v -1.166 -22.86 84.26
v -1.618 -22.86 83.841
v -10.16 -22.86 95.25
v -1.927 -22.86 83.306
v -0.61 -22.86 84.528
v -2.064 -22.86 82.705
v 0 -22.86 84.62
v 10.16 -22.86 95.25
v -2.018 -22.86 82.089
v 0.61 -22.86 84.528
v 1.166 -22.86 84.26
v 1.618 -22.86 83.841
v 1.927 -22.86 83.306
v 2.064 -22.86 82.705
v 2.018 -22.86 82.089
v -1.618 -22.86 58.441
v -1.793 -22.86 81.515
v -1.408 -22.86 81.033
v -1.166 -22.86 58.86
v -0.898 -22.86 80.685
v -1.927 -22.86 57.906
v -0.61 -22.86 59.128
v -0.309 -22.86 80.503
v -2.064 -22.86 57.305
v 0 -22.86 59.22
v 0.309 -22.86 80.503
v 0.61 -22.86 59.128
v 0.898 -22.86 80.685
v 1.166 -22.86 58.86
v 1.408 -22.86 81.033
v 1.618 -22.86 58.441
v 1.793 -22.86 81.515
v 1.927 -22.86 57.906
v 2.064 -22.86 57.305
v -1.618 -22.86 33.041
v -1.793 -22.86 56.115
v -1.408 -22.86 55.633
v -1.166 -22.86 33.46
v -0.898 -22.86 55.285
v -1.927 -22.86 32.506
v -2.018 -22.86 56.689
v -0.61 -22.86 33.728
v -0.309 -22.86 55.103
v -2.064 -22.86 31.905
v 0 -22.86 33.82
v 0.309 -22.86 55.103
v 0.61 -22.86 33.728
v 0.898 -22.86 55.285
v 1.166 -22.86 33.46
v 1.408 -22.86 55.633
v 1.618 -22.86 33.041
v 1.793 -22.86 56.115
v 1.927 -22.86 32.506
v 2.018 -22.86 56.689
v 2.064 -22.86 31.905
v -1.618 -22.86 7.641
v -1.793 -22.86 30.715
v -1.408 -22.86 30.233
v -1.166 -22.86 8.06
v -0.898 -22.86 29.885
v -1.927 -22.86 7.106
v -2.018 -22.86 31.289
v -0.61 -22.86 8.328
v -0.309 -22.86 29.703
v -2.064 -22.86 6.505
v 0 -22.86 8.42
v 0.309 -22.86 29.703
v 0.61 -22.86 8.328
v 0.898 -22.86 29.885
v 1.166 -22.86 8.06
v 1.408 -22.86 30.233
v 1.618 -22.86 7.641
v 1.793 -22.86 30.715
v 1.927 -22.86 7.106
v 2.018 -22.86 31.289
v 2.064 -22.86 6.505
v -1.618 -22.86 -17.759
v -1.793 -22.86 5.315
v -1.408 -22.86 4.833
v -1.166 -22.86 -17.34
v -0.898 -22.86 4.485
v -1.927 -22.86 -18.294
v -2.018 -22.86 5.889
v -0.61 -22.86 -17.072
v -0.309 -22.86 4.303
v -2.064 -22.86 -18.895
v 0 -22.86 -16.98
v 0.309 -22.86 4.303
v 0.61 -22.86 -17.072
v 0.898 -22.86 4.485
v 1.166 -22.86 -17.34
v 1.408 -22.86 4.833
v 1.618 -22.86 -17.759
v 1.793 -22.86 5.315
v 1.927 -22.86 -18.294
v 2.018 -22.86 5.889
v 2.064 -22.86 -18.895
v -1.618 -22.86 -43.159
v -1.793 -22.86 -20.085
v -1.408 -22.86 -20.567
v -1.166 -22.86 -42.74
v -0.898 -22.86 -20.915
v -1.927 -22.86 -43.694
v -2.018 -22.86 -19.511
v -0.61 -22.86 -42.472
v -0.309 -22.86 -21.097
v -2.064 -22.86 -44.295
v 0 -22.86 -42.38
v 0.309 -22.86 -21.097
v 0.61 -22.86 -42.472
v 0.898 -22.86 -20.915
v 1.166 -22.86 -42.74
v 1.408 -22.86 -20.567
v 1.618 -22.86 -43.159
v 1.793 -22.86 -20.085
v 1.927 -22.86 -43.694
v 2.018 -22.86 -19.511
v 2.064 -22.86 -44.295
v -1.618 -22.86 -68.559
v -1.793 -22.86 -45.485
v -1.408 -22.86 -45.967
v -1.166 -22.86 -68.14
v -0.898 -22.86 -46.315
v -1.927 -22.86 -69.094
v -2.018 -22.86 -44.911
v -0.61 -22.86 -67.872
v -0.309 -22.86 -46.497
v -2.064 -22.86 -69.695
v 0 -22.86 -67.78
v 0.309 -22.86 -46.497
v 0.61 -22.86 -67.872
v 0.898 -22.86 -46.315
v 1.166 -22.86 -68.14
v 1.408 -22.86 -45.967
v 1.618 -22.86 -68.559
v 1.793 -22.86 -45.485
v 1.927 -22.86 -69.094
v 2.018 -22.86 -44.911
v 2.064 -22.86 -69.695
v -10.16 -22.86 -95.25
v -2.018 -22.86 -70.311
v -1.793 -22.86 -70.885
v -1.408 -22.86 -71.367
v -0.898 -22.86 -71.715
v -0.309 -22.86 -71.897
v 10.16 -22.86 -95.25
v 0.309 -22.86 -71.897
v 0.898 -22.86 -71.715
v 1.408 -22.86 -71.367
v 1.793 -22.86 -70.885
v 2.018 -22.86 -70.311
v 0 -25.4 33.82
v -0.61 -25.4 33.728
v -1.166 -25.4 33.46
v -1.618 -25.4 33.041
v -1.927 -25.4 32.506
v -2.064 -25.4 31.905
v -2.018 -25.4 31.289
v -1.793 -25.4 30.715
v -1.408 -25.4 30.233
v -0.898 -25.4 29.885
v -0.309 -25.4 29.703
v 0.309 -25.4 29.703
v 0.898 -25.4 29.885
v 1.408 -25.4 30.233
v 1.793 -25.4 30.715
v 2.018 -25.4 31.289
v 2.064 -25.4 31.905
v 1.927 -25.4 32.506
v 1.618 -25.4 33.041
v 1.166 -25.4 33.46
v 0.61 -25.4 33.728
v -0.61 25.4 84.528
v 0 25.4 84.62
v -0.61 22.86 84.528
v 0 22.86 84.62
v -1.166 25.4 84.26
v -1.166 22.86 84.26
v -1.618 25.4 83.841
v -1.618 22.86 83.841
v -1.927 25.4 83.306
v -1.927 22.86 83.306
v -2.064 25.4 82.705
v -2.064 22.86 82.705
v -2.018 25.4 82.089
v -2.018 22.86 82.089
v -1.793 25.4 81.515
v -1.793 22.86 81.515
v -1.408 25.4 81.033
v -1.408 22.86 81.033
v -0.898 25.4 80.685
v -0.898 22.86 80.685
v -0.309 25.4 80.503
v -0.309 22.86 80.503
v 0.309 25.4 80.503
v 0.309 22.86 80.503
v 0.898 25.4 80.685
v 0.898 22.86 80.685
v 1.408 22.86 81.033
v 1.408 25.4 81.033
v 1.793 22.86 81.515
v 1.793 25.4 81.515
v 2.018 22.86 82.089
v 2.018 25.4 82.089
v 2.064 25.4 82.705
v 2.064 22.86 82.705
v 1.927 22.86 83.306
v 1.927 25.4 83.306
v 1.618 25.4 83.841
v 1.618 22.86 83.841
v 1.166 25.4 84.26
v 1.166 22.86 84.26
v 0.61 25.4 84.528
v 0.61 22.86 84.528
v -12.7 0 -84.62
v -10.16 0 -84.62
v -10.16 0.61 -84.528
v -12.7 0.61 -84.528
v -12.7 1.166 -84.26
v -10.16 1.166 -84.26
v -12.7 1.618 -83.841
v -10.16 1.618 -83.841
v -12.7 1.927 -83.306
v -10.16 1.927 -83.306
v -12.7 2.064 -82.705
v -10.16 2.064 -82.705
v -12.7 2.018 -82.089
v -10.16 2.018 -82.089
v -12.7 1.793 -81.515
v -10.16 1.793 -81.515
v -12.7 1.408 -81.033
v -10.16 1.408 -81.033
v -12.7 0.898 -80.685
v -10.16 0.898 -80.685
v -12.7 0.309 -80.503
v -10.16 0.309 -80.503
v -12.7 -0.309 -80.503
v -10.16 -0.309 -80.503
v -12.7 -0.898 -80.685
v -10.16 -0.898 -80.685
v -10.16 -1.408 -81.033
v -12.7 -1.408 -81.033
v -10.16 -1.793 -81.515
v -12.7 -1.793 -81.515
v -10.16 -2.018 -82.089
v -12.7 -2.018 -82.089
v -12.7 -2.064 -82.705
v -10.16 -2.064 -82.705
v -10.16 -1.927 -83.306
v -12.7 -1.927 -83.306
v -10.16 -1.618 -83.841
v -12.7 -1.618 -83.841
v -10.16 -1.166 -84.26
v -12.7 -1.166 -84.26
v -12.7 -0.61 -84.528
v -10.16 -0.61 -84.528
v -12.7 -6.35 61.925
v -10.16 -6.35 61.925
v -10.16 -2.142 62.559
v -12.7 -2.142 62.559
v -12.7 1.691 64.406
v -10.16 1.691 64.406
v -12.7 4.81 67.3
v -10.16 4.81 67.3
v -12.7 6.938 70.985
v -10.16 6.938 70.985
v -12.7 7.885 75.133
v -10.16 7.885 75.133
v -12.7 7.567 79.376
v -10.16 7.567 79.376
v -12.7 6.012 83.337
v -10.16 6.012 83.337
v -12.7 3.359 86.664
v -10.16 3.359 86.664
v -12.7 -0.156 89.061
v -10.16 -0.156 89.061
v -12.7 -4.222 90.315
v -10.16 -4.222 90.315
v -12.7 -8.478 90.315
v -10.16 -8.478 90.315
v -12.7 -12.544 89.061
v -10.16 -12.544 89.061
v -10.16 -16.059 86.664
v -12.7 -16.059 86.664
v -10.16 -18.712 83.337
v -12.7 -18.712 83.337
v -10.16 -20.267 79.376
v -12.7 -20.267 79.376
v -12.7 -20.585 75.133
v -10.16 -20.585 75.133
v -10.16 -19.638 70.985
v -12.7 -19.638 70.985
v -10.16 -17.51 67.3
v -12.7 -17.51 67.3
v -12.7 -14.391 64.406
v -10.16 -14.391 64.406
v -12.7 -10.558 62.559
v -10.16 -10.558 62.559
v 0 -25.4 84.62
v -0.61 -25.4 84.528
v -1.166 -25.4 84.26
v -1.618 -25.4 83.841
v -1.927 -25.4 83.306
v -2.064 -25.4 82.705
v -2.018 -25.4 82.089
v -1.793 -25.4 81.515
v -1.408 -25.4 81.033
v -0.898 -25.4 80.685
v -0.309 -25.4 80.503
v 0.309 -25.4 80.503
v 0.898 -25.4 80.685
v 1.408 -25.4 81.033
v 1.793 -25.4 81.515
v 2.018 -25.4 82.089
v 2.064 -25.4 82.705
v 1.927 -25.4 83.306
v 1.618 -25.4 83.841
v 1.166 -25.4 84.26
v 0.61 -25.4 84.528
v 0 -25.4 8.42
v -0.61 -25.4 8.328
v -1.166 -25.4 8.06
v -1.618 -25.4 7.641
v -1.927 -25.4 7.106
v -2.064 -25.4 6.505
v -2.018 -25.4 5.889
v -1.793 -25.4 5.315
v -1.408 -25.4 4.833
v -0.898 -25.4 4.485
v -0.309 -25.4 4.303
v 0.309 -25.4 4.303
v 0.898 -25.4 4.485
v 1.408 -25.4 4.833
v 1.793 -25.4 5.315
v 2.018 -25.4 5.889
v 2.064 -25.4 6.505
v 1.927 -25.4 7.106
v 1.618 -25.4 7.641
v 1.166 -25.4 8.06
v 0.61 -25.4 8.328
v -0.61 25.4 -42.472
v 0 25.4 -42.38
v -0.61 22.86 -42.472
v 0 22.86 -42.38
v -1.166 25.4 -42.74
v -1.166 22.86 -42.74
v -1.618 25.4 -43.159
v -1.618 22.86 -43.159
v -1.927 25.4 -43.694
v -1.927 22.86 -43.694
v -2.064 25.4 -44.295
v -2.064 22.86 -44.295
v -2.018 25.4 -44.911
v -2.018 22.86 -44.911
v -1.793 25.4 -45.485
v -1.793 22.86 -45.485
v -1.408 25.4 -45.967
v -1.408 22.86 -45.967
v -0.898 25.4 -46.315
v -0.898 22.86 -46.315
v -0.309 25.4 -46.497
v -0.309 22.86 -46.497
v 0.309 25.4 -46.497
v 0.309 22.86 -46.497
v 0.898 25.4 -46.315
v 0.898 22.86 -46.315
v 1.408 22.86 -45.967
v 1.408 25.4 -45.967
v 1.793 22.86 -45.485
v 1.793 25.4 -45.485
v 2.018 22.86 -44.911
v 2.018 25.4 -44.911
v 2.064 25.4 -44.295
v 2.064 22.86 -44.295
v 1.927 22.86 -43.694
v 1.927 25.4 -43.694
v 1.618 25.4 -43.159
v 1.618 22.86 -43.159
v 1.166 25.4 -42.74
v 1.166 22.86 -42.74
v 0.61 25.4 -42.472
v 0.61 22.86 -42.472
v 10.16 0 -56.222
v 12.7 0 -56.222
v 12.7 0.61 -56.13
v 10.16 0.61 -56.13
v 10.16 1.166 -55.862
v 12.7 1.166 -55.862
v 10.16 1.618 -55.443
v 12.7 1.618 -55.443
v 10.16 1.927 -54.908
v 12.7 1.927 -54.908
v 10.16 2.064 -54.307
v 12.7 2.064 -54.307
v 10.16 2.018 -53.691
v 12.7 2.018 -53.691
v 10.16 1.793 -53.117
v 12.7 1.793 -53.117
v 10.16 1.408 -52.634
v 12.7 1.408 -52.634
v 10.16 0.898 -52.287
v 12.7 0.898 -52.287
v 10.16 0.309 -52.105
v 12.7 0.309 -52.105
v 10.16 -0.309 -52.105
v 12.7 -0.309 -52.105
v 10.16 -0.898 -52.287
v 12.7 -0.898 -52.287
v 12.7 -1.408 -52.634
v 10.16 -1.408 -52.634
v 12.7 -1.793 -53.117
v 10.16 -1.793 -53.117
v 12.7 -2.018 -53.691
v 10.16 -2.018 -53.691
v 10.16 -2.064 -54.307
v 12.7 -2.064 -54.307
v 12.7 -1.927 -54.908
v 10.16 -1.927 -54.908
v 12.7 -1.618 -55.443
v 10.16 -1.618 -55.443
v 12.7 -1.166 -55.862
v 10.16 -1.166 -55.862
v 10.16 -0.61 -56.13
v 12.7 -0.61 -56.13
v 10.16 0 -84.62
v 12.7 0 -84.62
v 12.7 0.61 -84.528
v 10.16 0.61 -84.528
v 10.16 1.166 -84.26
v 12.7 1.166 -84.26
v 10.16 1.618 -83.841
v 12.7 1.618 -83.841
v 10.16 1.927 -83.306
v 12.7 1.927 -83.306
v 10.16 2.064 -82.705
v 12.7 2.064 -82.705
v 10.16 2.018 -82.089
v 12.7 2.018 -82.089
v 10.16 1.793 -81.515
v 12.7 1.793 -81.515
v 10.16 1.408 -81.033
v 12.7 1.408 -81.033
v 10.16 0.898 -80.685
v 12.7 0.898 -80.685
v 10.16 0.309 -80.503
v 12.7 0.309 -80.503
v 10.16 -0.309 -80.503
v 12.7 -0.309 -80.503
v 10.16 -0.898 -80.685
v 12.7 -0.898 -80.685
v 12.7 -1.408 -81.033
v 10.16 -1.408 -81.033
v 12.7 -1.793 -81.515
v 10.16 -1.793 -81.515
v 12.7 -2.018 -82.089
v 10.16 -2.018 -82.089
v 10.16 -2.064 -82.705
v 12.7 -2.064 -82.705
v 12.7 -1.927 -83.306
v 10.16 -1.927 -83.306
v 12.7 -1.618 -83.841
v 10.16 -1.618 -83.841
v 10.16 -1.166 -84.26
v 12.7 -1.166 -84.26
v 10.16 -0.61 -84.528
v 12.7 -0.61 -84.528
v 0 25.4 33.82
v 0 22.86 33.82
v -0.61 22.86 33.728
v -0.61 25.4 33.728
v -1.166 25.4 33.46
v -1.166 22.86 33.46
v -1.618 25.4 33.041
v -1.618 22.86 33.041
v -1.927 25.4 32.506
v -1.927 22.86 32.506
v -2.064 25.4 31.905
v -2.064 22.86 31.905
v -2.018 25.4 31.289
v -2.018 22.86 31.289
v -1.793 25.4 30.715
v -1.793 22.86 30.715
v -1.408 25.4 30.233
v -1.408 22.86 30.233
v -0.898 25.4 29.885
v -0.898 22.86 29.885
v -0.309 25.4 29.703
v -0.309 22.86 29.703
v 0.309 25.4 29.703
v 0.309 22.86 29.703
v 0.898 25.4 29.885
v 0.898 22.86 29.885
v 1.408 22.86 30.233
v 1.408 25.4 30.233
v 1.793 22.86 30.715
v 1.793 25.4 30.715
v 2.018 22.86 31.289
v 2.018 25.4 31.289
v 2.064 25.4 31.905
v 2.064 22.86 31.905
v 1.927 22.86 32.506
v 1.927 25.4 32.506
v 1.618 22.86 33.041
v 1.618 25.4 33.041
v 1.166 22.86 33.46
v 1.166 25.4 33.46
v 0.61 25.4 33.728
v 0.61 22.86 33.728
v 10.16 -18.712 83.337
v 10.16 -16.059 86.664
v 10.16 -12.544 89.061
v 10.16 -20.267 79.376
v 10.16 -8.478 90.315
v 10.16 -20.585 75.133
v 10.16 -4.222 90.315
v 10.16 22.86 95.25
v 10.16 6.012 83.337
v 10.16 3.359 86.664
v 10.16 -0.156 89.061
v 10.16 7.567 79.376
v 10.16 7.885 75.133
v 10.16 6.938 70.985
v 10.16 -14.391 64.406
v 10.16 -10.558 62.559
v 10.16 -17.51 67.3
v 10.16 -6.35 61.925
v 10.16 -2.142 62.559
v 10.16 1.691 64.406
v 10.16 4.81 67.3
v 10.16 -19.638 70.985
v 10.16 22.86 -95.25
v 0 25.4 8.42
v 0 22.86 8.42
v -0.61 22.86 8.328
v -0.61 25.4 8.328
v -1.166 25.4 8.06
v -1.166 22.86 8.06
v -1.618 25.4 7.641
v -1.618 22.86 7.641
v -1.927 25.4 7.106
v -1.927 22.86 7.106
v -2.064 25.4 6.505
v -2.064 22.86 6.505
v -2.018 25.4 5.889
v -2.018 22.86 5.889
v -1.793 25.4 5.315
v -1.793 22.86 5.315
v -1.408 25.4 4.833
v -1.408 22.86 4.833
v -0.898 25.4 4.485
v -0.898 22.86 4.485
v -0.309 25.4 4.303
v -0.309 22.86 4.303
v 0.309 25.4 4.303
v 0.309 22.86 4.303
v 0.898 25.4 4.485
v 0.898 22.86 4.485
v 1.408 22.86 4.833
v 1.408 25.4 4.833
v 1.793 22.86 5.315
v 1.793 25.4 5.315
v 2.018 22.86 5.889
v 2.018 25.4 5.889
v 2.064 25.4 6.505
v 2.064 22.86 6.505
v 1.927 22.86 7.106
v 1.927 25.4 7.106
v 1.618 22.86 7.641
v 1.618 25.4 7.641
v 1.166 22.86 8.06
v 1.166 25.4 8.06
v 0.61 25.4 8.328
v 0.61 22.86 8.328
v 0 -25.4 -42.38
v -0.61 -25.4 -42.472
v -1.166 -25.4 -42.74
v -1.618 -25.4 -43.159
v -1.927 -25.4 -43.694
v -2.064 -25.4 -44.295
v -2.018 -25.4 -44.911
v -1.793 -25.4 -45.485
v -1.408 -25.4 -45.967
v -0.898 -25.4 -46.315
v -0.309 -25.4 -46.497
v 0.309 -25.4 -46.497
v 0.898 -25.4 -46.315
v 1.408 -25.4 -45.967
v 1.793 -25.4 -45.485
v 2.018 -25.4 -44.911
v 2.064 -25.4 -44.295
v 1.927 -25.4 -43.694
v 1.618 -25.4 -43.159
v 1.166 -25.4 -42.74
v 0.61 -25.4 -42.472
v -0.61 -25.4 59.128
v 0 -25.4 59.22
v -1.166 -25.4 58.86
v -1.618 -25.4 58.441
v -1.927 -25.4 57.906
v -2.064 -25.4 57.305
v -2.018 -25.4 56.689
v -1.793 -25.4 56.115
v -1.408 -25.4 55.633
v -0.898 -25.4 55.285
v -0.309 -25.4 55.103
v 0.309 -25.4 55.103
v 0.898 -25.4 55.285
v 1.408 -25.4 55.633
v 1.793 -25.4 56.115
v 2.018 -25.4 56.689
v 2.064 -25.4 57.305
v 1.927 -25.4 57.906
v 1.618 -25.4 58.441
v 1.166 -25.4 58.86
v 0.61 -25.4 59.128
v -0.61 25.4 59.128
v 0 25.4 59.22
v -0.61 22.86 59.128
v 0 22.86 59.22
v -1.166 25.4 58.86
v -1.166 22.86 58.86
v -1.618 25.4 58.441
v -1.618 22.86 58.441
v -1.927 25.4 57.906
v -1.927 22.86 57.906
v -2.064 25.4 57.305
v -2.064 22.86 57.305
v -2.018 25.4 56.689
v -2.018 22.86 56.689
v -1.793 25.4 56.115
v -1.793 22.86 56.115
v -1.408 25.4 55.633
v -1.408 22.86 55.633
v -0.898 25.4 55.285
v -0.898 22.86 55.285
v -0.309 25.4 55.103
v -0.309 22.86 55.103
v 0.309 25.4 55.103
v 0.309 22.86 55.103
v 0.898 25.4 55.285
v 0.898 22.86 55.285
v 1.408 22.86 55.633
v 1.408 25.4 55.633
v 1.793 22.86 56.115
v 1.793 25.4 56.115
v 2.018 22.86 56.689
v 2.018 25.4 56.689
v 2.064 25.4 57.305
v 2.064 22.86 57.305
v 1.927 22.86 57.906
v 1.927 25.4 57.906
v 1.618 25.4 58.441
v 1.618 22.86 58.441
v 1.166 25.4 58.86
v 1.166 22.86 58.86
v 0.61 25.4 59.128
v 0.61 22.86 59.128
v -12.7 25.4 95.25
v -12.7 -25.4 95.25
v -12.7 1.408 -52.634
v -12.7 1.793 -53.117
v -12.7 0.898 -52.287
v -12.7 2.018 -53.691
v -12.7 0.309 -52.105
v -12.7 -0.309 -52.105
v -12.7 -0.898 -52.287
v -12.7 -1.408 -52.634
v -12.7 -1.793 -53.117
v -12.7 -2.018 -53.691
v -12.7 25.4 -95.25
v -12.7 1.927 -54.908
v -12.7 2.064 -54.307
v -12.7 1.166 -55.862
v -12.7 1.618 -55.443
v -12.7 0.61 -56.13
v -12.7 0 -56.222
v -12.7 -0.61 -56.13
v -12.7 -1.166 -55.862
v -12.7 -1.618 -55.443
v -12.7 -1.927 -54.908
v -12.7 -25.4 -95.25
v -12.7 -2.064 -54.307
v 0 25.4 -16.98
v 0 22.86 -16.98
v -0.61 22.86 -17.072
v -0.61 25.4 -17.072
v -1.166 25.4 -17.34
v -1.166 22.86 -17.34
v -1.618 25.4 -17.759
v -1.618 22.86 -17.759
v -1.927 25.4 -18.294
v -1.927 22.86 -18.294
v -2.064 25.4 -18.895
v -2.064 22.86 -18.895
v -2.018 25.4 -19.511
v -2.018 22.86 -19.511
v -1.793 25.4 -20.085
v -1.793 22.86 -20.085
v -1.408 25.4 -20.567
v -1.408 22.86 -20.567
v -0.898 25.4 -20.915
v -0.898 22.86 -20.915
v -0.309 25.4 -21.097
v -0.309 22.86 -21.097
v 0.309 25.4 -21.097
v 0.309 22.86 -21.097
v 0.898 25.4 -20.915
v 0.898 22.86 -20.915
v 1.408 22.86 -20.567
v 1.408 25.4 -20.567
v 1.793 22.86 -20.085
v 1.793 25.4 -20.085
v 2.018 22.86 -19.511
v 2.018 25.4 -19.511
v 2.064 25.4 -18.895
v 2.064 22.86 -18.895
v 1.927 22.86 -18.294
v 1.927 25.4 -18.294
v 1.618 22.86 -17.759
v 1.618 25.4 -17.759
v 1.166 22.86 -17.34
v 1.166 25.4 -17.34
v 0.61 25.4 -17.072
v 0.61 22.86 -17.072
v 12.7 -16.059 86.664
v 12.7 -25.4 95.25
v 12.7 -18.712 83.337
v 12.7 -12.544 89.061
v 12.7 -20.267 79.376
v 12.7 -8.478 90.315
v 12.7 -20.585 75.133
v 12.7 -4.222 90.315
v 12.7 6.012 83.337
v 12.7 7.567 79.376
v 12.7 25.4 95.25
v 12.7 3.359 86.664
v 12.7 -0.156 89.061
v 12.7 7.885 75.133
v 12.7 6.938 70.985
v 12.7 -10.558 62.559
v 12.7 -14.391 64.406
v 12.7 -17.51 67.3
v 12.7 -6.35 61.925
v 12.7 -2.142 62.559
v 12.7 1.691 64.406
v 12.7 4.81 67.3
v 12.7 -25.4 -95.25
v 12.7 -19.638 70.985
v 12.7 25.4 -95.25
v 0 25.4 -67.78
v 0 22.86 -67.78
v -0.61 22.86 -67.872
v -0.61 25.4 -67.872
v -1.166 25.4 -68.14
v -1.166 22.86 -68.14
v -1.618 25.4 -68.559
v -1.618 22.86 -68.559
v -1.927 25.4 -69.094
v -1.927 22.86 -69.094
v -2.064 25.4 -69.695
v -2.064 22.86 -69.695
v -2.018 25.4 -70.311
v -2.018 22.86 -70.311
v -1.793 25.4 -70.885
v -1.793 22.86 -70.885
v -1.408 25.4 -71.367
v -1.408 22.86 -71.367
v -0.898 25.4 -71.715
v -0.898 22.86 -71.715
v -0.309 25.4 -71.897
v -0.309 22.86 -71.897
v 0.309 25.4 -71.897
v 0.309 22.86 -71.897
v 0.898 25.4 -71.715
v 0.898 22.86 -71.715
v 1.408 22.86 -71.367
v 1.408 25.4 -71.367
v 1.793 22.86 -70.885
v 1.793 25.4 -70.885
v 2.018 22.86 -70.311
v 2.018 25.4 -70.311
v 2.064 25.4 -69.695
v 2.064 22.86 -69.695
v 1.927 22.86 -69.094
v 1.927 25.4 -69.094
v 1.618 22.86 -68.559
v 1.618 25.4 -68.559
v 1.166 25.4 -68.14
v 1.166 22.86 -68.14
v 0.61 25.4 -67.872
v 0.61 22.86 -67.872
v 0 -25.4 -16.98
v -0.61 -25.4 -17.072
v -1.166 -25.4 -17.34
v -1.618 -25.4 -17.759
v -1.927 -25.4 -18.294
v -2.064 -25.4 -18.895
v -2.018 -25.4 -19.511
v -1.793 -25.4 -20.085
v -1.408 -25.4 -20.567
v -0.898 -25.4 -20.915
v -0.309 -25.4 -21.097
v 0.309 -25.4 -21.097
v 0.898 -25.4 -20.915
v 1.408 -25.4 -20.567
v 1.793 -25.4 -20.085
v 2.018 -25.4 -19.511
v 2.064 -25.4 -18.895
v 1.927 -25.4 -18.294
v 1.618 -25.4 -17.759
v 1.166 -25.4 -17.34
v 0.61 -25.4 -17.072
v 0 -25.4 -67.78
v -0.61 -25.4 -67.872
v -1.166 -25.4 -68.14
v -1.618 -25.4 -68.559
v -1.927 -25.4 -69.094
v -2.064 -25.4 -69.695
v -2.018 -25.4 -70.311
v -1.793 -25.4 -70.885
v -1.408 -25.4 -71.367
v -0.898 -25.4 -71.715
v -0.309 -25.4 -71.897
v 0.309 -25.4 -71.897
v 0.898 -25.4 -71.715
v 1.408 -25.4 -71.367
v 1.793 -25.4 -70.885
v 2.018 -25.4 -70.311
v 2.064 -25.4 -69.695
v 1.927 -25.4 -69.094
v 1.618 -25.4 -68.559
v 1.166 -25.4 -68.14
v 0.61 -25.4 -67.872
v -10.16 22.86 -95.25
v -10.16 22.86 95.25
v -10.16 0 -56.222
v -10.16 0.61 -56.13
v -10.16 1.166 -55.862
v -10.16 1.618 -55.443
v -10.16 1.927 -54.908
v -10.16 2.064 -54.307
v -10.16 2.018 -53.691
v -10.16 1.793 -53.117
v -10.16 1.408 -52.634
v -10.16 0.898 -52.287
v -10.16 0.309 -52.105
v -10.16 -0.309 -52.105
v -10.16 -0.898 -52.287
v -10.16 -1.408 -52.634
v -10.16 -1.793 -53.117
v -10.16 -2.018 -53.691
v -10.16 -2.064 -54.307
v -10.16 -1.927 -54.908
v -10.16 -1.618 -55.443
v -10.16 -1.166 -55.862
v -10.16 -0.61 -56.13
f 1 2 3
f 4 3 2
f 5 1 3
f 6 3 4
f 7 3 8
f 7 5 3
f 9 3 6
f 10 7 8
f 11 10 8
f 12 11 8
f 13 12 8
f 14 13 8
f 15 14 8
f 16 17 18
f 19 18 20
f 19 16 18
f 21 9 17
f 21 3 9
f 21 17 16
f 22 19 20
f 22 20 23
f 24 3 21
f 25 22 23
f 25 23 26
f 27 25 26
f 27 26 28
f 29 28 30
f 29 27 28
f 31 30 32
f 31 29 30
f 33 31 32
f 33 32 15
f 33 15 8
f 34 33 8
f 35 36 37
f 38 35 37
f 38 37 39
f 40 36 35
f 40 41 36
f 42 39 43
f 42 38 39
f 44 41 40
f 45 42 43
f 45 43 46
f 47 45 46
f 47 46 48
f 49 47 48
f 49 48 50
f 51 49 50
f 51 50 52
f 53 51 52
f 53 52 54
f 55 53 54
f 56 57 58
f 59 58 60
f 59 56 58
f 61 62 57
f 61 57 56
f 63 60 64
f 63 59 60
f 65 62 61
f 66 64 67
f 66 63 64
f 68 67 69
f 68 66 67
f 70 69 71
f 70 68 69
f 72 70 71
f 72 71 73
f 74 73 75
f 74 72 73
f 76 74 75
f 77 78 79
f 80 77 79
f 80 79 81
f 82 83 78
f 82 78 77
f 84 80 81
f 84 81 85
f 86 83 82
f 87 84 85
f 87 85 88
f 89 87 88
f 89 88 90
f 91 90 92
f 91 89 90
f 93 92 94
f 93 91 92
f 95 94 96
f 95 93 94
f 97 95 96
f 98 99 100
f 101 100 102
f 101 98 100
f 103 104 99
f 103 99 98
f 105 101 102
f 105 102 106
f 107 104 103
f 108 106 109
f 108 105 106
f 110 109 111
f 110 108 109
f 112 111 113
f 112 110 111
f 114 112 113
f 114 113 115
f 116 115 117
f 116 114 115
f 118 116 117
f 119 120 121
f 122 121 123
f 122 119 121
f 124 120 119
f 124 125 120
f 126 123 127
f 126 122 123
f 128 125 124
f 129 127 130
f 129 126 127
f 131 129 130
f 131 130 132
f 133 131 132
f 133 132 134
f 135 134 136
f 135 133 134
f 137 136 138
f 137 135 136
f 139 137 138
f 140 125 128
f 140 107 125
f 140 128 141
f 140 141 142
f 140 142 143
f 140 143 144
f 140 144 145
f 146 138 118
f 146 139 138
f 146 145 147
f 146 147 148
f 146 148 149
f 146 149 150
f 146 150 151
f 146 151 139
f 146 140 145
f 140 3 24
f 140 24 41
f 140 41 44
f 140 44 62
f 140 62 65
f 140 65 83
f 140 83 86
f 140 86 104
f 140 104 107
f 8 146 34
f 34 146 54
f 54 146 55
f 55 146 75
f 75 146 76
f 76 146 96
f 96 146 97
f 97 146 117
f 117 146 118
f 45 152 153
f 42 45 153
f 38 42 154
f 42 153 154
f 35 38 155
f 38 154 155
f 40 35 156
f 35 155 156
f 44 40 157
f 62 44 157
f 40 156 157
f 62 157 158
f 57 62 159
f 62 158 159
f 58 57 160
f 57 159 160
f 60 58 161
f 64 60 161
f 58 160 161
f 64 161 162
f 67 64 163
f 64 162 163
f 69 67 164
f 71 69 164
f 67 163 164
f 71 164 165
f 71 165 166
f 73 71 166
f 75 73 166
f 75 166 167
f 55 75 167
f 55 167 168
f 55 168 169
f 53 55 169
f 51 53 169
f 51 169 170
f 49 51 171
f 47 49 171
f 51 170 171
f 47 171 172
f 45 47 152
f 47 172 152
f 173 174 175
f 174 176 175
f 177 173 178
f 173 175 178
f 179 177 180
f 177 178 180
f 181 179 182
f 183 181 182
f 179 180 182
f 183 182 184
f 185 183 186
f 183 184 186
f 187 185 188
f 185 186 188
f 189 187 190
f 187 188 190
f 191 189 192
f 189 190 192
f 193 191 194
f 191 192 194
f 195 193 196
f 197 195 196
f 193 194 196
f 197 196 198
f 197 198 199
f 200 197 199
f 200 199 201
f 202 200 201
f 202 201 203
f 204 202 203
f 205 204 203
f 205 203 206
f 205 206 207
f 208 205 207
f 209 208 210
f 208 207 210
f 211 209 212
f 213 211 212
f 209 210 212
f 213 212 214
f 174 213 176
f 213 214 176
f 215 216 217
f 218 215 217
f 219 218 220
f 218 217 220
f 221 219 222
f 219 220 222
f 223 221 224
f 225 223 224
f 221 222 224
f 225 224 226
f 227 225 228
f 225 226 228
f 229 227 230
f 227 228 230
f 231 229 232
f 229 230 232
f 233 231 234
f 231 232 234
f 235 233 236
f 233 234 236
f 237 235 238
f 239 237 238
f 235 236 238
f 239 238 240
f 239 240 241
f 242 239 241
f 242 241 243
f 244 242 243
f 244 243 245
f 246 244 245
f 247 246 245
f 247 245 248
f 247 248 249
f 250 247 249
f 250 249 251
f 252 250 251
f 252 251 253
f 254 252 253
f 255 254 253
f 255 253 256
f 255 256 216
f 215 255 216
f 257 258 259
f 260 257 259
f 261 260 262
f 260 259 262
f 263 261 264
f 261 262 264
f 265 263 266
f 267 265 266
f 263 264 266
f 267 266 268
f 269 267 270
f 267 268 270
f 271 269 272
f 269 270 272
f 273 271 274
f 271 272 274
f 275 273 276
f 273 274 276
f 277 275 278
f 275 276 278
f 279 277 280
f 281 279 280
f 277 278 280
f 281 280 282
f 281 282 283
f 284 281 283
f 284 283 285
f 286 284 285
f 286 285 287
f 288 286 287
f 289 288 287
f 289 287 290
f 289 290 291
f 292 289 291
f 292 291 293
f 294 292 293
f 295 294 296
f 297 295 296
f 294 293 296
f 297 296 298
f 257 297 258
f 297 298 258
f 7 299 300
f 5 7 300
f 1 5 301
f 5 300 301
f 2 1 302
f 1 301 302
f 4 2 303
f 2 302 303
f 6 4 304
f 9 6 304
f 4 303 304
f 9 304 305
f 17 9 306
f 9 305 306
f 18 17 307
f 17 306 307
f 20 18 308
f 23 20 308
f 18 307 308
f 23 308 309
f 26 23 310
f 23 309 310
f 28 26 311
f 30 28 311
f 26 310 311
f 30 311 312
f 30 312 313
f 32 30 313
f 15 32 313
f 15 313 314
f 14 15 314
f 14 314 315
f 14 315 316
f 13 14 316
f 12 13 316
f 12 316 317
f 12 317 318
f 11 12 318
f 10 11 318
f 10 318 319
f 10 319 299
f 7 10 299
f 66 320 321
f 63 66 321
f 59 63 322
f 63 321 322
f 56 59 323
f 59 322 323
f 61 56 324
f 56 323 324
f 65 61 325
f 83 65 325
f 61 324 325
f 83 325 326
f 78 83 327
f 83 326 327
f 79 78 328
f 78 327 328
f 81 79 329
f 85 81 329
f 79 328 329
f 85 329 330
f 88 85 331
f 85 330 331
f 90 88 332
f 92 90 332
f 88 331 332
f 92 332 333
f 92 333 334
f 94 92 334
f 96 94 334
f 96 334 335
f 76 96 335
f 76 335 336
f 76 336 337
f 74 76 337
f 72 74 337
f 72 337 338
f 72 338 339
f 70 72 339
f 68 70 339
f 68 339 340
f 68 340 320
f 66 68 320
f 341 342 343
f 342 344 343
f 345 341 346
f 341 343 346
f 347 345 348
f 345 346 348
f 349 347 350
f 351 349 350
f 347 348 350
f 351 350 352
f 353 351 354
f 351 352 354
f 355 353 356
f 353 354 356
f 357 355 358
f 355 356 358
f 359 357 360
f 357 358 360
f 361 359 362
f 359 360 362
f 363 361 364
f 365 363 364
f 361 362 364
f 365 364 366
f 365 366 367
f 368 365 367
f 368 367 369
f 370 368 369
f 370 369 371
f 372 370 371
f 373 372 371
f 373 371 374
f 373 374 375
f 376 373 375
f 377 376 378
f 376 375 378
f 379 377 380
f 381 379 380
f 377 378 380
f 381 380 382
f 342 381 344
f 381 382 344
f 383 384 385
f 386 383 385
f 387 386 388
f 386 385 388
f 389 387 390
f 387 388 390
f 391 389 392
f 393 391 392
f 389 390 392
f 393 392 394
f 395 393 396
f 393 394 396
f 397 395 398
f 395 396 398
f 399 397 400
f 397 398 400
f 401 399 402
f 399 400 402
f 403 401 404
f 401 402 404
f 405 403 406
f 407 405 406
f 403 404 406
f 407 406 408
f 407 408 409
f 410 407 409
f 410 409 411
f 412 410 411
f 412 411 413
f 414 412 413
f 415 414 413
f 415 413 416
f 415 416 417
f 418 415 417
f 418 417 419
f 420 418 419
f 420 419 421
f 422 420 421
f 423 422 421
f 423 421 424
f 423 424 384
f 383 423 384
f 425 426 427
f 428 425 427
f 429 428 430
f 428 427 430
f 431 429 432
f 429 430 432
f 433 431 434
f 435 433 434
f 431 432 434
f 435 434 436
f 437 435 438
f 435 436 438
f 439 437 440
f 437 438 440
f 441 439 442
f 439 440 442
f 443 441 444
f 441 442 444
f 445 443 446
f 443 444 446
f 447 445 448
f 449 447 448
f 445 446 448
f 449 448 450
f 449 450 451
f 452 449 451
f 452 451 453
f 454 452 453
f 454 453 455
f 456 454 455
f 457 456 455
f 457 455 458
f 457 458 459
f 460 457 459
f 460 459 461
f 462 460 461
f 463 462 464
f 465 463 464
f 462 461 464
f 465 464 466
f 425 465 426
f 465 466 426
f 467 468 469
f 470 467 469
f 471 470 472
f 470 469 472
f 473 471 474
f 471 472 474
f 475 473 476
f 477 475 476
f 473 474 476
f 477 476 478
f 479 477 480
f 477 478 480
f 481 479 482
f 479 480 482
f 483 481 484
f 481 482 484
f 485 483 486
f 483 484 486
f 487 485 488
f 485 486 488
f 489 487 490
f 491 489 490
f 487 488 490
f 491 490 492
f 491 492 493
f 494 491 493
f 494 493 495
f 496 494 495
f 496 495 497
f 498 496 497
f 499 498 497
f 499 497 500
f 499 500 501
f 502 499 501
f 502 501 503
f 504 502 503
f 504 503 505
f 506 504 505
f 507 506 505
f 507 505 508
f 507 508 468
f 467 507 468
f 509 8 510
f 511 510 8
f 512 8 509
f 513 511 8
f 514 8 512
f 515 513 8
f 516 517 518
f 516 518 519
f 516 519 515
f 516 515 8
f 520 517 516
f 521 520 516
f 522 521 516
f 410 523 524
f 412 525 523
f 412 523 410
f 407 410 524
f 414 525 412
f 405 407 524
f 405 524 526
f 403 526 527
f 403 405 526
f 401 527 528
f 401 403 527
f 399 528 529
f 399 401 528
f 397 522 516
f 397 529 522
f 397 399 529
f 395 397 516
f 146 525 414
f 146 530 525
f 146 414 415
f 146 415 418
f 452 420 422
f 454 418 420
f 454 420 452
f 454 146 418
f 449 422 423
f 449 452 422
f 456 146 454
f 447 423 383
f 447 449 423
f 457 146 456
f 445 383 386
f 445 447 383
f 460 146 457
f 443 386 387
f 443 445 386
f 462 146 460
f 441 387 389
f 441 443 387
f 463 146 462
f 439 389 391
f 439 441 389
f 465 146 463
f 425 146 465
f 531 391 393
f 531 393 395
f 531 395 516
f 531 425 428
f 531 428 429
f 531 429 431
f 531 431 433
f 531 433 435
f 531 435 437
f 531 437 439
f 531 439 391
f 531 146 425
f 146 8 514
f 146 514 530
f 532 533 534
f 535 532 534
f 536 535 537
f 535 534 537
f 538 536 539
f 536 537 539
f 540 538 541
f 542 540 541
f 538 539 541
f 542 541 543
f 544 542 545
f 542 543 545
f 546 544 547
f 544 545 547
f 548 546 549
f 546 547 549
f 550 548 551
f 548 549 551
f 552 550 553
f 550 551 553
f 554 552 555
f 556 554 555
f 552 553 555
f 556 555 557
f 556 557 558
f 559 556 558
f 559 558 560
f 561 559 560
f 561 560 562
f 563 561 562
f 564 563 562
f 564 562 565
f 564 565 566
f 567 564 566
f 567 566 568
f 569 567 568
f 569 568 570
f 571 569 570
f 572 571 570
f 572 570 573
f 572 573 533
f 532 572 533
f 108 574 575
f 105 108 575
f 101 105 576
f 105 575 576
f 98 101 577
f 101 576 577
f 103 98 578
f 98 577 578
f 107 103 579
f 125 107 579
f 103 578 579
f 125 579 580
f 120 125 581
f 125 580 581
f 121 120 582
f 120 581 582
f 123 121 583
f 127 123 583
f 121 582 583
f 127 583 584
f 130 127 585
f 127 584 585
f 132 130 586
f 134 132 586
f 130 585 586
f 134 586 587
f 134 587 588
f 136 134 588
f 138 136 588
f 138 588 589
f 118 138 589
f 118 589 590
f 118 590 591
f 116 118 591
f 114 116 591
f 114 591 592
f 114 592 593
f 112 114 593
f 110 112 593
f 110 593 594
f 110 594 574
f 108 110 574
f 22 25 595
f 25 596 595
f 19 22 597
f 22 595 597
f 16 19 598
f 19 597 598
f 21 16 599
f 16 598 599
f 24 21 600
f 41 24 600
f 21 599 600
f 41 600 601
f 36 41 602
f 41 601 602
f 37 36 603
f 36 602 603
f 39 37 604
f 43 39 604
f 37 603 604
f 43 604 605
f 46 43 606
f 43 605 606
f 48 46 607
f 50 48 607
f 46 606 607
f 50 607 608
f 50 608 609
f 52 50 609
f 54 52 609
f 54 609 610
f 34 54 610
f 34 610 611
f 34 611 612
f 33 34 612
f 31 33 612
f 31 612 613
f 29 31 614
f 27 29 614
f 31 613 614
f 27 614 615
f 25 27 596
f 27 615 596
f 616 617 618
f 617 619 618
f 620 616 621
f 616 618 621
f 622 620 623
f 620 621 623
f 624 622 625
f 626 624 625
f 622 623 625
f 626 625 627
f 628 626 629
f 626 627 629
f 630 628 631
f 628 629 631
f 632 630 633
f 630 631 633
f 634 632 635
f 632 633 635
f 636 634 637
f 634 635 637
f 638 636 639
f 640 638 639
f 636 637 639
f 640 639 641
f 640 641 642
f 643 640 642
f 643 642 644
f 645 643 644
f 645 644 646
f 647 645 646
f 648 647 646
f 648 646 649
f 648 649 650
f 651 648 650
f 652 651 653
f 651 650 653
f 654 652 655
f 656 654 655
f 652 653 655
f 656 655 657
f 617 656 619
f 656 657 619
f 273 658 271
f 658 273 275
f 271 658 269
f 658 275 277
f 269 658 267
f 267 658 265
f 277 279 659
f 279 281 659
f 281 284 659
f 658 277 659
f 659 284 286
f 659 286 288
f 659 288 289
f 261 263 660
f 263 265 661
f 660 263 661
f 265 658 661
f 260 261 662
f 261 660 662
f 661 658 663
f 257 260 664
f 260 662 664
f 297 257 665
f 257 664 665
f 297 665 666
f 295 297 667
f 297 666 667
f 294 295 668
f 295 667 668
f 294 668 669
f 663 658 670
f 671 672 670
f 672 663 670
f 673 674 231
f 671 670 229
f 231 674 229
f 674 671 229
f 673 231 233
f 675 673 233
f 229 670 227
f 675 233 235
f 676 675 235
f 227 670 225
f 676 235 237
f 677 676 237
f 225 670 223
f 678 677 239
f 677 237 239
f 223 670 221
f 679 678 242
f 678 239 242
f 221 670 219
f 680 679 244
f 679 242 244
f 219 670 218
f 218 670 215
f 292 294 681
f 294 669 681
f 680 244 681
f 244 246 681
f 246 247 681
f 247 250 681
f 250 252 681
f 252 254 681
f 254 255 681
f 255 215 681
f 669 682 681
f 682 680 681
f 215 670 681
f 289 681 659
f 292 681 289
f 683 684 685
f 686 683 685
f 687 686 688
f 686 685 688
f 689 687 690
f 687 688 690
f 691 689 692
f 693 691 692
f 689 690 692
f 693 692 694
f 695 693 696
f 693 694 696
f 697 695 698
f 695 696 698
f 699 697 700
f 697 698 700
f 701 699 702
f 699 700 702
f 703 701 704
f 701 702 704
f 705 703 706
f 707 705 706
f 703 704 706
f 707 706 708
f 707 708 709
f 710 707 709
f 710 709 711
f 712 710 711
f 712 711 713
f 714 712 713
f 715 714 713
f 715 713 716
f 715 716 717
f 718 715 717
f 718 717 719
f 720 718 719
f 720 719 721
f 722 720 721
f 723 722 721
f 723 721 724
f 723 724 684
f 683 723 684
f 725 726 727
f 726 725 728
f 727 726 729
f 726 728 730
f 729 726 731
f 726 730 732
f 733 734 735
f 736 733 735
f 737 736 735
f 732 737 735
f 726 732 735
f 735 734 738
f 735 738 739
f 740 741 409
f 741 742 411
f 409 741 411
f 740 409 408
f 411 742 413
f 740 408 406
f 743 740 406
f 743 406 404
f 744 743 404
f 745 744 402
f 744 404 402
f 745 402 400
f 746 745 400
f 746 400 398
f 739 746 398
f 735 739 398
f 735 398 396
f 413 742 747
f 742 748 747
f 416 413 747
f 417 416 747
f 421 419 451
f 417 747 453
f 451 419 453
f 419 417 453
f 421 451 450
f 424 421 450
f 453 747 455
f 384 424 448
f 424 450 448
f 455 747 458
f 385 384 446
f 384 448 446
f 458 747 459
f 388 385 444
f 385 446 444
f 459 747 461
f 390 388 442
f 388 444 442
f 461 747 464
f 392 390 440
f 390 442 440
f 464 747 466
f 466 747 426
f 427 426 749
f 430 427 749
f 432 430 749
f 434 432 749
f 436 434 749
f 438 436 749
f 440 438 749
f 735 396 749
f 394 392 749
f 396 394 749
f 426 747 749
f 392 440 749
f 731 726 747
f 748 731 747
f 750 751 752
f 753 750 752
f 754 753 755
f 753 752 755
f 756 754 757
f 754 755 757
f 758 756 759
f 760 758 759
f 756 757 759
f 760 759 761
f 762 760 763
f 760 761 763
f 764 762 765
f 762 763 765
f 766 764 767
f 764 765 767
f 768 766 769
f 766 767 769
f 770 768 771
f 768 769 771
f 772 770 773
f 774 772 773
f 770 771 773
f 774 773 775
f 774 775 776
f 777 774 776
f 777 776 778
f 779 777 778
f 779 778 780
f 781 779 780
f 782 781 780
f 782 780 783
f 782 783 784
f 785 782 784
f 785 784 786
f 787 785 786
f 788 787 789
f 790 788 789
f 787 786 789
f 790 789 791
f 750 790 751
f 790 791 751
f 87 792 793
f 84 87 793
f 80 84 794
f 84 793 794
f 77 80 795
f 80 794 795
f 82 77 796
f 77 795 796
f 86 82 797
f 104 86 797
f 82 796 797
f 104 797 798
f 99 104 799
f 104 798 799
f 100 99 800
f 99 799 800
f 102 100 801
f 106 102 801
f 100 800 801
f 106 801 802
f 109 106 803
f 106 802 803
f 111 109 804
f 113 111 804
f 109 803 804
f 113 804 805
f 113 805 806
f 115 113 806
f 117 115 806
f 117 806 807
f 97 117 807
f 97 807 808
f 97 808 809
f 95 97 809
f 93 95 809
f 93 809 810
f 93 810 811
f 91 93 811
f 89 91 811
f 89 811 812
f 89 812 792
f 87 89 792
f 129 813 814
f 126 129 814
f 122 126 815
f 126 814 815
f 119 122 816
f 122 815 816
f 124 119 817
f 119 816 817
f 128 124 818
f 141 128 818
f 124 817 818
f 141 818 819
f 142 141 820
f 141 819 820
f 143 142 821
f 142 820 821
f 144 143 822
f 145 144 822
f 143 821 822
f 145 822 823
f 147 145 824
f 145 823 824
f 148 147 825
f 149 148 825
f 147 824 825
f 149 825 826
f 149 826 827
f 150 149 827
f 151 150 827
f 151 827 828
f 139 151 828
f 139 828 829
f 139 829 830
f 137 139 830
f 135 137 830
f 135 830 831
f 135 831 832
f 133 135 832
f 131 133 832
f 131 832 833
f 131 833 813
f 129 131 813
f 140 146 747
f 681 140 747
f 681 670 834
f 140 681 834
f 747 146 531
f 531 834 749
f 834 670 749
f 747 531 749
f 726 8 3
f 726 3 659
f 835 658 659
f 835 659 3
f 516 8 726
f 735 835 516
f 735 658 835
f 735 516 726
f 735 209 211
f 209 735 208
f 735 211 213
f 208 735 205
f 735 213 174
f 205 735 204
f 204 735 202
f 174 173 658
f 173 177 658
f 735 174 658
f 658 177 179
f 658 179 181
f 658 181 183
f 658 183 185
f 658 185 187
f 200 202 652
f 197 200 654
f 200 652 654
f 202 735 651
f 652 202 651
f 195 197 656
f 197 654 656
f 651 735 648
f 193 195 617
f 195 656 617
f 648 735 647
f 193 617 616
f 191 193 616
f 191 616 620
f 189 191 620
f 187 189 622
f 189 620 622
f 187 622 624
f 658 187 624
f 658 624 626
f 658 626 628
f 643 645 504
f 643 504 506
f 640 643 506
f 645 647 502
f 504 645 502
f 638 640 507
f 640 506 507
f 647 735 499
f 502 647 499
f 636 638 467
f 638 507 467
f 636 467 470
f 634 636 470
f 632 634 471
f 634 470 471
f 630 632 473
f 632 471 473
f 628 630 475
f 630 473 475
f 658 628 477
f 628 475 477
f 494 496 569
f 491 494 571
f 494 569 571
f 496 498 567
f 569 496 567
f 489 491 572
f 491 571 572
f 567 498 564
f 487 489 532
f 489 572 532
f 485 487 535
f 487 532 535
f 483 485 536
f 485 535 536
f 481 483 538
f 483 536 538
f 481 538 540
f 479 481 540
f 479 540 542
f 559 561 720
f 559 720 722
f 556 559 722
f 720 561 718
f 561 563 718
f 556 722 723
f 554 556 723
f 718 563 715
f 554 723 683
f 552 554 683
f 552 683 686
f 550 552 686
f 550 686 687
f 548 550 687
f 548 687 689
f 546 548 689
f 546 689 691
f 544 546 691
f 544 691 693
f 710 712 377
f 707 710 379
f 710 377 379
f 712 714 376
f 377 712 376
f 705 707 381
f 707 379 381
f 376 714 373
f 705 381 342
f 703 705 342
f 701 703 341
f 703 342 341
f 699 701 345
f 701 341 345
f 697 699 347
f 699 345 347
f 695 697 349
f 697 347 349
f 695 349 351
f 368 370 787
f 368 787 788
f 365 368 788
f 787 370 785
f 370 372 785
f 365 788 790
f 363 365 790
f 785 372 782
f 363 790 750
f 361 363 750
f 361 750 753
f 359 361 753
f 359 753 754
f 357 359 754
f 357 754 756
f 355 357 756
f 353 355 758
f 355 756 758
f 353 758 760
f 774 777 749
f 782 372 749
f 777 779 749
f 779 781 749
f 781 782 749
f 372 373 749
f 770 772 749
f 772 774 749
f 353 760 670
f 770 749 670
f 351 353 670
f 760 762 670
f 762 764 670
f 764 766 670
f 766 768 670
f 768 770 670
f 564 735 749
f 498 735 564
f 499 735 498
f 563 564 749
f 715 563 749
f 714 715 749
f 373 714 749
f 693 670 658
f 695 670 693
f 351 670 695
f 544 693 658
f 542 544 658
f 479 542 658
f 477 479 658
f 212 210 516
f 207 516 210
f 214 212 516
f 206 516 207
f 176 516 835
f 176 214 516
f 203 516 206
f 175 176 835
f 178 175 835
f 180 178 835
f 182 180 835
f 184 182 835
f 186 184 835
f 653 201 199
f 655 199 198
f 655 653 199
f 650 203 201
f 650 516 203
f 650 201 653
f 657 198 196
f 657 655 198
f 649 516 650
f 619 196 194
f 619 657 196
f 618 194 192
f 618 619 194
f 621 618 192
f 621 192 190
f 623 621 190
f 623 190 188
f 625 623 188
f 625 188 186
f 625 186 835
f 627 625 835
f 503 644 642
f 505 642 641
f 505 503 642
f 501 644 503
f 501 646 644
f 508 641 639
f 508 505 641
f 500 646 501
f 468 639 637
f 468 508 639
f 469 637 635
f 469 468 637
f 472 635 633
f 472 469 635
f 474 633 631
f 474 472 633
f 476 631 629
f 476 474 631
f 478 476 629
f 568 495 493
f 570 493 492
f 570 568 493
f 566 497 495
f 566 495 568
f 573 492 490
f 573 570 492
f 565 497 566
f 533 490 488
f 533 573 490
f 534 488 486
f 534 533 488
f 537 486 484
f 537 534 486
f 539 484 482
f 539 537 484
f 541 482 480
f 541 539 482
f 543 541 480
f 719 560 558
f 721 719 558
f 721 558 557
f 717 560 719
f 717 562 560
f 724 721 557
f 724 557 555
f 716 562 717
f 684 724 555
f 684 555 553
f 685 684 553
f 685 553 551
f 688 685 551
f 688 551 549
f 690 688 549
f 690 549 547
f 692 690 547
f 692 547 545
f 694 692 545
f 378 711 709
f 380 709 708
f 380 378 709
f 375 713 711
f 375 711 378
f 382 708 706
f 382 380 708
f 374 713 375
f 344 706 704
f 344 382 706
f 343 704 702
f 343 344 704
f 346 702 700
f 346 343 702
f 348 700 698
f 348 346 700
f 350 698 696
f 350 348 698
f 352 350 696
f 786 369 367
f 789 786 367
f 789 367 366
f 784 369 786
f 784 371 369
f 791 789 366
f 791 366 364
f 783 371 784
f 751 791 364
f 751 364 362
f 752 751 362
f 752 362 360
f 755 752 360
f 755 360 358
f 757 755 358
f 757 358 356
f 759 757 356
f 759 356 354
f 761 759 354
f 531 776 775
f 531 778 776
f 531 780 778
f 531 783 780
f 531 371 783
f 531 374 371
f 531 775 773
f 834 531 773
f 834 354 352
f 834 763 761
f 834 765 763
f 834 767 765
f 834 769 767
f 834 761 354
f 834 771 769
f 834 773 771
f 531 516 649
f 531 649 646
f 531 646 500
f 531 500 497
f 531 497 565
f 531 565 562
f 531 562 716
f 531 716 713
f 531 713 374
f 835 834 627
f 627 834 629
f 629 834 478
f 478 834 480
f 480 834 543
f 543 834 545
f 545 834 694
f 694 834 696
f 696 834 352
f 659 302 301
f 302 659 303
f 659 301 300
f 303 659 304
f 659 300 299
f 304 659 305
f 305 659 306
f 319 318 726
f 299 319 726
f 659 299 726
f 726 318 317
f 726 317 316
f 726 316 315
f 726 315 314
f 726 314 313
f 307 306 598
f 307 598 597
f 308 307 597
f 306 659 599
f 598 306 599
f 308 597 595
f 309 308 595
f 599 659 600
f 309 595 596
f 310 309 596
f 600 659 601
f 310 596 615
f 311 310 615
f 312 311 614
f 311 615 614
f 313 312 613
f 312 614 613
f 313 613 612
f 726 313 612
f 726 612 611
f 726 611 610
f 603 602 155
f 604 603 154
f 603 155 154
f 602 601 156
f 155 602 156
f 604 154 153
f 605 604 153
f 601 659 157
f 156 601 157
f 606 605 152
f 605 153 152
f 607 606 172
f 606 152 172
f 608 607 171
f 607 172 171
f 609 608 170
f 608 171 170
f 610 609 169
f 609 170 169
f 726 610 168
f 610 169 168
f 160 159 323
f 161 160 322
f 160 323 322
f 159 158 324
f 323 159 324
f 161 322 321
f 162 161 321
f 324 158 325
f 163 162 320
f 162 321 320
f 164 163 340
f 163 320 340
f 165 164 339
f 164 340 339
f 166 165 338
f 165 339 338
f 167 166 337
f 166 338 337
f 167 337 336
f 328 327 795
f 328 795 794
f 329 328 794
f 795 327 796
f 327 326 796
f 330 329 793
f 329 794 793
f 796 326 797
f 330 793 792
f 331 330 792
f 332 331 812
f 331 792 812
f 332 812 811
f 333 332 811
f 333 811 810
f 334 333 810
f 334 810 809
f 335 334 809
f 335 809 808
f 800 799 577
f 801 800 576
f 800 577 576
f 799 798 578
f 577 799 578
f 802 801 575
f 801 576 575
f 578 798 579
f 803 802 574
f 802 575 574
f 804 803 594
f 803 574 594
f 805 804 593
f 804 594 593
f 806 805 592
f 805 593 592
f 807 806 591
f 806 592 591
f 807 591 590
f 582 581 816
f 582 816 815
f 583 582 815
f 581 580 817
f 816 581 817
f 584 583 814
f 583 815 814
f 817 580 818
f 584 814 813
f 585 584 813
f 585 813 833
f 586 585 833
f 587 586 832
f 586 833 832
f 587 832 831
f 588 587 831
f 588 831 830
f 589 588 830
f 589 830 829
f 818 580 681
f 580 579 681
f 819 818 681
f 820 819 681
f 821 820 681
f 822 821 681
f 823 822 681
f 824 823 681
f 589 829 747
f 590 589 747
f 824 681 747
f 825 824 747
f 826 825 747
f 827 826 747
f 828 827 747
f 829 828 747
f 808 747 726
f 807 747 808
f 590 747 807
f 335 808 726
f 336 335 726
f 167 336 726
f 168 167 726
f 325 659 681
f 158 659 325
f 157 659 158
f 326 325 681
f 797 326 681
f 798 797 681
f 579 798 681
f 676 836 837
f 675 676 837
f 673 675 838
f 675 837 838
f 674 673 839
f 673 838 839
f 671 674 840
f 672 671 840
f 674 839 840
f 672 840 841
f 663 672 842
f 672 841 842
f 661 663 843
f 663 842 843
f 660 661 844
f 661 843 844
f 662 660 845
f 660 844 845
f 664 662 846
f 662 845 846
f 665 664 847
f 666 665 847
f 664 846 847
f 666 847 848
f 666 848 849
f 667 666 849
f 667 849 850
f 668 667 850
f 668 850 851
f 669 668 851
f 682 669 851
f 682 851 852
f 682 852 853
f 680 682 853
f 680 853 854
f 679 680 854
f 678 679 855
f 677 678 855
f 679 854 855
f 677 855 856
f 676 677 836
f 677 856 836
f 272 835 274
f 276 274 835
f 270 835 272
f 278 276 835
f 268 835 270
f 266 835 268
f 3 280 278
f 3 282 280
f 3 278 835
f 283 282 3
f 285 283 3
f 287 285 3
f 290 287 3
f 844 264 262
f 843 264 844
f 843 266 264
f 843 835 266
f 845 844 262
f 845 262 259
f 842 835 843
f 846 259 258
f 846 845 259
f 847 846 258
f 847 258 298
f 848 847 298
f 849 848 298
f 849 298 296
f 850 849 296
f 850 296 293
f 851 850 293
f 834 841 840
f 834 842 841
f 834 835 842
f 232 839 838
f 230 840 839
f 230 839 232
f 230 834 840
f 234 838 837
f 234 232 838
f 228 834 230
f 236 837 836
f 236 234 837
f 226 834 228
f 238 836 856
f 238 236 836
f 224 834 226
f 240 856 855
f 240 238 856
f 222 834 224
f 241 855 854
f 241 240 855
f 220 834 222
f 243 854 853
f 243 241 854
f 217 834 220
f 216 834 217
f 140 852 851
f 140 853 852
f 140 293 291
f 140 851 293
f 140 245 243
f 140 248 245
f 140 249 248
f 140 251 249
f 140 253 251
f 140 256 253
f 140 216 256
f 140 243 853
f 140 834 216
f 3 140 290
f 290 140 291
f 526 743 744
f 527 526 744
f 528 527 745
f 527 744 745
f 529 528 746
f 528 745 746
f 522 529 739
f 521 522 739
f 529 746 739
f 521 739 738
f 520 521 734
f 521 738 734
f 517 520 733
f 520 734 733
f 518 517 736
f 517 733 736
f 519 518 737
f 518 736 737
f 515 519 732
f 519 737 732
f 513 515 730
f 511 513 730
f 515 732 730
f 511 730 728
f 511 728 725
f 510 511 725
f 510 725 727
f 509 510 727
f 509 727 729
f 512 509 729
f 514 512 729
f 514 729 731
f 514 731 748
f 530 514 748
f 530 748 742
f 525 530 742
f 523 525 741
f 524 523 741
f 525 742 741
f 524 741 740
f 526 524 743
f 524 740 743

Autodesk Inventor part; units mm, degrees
ref_plane "YZ Plane" through (0, 0, 0) normal (1, 0, 0) x (0, 1, 0)
ref_plane "XZ Plane" through (0, 0, 0) normal (0, 1, 0) x (-1, 0, 0)
ref_plane "XY Plane" through (0, 0, 0) normal (0, 0, 1) x (1, 0, 0)
sketch "Sketch1" plane through (0, 0, 0) normal (0, 0, 1) x (1, 0, 0)
  line L0 (-12.7, -25.4) -> (12.7, -25.4)
  line L1 (12.7, -25.4) -> (12.7, 25.4)
  line L2 (12.7, 25.4) -> (-12.7, 25.4)
  line L3 (-12.7, 25.4) -> (-12.7, -25.4)
  line L4 (-12.7, -25.4) -> (12.7, 25.4) construction
  line L5 (12.7, -25.4) -> (-12.7, 25.4) construction
  line L6 (-10.16, -22.86) -> (10.16, -22.86)
  line L7 (10.16, -22.86) -> (10.16, 22.86)
  line L8 (10.16, 22.86) -> (-10.16, 22.86)
  line L9 (-10.16, 22.86) -> (-10.16, -22.86)
  line L10 (-10.16, -22.86) -> (10.16, 22.86) construction
  line L11 (10.16, -22.86) -> (-10.16, 22.86) construction
  point P0 (0, 0)
  dimension "d0" = 25.4
  dimension "d1" = 50.8
  dimension "d2" = 20.32
  dimension "d3" = 45.72
extrude "Extrusion1" add sketch "Sketch1" along normal mid plane 190.5
sketch "Sketch2" plane through (-12.7, 25.4, 95.25) normal (0, 1, 0) x (1, 0, 0)
  line L0 (0, 190.5) -> (0, 0) projected
  line L1 (25.4, 0) -> (0, 0) projected
  point P0 (12.7, 95.25)
  point P1 (12.7, 12.7)
  dimension "d6" = 12.7
  dimension "d7" = 12.7
hole "Hole1" at (0, 25.4, 82.55) direction (0, -1, 0) diameter 4.1402 end through all
pattern_linear "Rectangular Pattern1" count 7 spacing 25.4 along (0, 0, -1) of "Hole1"
sketch "Sketch3" plane through (12.7, -25.4, 95.25) normal (1, 0, 0) x (0, 0, -1)
  line L0 (0, 0) -> (0, 50.8) projected
  line L1 (190.5, 0) -> (0, 0) projected
  line L2 (190.5, 50.8) -> (190.5, 0) projected
  circle A0 centre (19.05, 19.05) radius 14.2748
  line L3 (190.5, 50.8) -> (0, 50.8) projected
  circle A1 centre (149.4019, 25.4) radius 2.0701
  circle A2 centre (177.8, 25.4) radius 2.0701
  point P0 (95.25, 25.4)
  dimension "d19" = 19.05
  dimension "d28" = 19.05
  dimension "d32" = 28.5496
  dimension "d35" = 25.4
  dimension "d36" = 12.7
  dimension "d37" = 28.3981
  dimension "d38" = 4.1402
  dimension "d39" = 4.1402
extrude "Extrusion2" cut sketch "Sketch3" against normal through all contours A0 | A1 | A2
properties part number "Diag_intake_hanger"
